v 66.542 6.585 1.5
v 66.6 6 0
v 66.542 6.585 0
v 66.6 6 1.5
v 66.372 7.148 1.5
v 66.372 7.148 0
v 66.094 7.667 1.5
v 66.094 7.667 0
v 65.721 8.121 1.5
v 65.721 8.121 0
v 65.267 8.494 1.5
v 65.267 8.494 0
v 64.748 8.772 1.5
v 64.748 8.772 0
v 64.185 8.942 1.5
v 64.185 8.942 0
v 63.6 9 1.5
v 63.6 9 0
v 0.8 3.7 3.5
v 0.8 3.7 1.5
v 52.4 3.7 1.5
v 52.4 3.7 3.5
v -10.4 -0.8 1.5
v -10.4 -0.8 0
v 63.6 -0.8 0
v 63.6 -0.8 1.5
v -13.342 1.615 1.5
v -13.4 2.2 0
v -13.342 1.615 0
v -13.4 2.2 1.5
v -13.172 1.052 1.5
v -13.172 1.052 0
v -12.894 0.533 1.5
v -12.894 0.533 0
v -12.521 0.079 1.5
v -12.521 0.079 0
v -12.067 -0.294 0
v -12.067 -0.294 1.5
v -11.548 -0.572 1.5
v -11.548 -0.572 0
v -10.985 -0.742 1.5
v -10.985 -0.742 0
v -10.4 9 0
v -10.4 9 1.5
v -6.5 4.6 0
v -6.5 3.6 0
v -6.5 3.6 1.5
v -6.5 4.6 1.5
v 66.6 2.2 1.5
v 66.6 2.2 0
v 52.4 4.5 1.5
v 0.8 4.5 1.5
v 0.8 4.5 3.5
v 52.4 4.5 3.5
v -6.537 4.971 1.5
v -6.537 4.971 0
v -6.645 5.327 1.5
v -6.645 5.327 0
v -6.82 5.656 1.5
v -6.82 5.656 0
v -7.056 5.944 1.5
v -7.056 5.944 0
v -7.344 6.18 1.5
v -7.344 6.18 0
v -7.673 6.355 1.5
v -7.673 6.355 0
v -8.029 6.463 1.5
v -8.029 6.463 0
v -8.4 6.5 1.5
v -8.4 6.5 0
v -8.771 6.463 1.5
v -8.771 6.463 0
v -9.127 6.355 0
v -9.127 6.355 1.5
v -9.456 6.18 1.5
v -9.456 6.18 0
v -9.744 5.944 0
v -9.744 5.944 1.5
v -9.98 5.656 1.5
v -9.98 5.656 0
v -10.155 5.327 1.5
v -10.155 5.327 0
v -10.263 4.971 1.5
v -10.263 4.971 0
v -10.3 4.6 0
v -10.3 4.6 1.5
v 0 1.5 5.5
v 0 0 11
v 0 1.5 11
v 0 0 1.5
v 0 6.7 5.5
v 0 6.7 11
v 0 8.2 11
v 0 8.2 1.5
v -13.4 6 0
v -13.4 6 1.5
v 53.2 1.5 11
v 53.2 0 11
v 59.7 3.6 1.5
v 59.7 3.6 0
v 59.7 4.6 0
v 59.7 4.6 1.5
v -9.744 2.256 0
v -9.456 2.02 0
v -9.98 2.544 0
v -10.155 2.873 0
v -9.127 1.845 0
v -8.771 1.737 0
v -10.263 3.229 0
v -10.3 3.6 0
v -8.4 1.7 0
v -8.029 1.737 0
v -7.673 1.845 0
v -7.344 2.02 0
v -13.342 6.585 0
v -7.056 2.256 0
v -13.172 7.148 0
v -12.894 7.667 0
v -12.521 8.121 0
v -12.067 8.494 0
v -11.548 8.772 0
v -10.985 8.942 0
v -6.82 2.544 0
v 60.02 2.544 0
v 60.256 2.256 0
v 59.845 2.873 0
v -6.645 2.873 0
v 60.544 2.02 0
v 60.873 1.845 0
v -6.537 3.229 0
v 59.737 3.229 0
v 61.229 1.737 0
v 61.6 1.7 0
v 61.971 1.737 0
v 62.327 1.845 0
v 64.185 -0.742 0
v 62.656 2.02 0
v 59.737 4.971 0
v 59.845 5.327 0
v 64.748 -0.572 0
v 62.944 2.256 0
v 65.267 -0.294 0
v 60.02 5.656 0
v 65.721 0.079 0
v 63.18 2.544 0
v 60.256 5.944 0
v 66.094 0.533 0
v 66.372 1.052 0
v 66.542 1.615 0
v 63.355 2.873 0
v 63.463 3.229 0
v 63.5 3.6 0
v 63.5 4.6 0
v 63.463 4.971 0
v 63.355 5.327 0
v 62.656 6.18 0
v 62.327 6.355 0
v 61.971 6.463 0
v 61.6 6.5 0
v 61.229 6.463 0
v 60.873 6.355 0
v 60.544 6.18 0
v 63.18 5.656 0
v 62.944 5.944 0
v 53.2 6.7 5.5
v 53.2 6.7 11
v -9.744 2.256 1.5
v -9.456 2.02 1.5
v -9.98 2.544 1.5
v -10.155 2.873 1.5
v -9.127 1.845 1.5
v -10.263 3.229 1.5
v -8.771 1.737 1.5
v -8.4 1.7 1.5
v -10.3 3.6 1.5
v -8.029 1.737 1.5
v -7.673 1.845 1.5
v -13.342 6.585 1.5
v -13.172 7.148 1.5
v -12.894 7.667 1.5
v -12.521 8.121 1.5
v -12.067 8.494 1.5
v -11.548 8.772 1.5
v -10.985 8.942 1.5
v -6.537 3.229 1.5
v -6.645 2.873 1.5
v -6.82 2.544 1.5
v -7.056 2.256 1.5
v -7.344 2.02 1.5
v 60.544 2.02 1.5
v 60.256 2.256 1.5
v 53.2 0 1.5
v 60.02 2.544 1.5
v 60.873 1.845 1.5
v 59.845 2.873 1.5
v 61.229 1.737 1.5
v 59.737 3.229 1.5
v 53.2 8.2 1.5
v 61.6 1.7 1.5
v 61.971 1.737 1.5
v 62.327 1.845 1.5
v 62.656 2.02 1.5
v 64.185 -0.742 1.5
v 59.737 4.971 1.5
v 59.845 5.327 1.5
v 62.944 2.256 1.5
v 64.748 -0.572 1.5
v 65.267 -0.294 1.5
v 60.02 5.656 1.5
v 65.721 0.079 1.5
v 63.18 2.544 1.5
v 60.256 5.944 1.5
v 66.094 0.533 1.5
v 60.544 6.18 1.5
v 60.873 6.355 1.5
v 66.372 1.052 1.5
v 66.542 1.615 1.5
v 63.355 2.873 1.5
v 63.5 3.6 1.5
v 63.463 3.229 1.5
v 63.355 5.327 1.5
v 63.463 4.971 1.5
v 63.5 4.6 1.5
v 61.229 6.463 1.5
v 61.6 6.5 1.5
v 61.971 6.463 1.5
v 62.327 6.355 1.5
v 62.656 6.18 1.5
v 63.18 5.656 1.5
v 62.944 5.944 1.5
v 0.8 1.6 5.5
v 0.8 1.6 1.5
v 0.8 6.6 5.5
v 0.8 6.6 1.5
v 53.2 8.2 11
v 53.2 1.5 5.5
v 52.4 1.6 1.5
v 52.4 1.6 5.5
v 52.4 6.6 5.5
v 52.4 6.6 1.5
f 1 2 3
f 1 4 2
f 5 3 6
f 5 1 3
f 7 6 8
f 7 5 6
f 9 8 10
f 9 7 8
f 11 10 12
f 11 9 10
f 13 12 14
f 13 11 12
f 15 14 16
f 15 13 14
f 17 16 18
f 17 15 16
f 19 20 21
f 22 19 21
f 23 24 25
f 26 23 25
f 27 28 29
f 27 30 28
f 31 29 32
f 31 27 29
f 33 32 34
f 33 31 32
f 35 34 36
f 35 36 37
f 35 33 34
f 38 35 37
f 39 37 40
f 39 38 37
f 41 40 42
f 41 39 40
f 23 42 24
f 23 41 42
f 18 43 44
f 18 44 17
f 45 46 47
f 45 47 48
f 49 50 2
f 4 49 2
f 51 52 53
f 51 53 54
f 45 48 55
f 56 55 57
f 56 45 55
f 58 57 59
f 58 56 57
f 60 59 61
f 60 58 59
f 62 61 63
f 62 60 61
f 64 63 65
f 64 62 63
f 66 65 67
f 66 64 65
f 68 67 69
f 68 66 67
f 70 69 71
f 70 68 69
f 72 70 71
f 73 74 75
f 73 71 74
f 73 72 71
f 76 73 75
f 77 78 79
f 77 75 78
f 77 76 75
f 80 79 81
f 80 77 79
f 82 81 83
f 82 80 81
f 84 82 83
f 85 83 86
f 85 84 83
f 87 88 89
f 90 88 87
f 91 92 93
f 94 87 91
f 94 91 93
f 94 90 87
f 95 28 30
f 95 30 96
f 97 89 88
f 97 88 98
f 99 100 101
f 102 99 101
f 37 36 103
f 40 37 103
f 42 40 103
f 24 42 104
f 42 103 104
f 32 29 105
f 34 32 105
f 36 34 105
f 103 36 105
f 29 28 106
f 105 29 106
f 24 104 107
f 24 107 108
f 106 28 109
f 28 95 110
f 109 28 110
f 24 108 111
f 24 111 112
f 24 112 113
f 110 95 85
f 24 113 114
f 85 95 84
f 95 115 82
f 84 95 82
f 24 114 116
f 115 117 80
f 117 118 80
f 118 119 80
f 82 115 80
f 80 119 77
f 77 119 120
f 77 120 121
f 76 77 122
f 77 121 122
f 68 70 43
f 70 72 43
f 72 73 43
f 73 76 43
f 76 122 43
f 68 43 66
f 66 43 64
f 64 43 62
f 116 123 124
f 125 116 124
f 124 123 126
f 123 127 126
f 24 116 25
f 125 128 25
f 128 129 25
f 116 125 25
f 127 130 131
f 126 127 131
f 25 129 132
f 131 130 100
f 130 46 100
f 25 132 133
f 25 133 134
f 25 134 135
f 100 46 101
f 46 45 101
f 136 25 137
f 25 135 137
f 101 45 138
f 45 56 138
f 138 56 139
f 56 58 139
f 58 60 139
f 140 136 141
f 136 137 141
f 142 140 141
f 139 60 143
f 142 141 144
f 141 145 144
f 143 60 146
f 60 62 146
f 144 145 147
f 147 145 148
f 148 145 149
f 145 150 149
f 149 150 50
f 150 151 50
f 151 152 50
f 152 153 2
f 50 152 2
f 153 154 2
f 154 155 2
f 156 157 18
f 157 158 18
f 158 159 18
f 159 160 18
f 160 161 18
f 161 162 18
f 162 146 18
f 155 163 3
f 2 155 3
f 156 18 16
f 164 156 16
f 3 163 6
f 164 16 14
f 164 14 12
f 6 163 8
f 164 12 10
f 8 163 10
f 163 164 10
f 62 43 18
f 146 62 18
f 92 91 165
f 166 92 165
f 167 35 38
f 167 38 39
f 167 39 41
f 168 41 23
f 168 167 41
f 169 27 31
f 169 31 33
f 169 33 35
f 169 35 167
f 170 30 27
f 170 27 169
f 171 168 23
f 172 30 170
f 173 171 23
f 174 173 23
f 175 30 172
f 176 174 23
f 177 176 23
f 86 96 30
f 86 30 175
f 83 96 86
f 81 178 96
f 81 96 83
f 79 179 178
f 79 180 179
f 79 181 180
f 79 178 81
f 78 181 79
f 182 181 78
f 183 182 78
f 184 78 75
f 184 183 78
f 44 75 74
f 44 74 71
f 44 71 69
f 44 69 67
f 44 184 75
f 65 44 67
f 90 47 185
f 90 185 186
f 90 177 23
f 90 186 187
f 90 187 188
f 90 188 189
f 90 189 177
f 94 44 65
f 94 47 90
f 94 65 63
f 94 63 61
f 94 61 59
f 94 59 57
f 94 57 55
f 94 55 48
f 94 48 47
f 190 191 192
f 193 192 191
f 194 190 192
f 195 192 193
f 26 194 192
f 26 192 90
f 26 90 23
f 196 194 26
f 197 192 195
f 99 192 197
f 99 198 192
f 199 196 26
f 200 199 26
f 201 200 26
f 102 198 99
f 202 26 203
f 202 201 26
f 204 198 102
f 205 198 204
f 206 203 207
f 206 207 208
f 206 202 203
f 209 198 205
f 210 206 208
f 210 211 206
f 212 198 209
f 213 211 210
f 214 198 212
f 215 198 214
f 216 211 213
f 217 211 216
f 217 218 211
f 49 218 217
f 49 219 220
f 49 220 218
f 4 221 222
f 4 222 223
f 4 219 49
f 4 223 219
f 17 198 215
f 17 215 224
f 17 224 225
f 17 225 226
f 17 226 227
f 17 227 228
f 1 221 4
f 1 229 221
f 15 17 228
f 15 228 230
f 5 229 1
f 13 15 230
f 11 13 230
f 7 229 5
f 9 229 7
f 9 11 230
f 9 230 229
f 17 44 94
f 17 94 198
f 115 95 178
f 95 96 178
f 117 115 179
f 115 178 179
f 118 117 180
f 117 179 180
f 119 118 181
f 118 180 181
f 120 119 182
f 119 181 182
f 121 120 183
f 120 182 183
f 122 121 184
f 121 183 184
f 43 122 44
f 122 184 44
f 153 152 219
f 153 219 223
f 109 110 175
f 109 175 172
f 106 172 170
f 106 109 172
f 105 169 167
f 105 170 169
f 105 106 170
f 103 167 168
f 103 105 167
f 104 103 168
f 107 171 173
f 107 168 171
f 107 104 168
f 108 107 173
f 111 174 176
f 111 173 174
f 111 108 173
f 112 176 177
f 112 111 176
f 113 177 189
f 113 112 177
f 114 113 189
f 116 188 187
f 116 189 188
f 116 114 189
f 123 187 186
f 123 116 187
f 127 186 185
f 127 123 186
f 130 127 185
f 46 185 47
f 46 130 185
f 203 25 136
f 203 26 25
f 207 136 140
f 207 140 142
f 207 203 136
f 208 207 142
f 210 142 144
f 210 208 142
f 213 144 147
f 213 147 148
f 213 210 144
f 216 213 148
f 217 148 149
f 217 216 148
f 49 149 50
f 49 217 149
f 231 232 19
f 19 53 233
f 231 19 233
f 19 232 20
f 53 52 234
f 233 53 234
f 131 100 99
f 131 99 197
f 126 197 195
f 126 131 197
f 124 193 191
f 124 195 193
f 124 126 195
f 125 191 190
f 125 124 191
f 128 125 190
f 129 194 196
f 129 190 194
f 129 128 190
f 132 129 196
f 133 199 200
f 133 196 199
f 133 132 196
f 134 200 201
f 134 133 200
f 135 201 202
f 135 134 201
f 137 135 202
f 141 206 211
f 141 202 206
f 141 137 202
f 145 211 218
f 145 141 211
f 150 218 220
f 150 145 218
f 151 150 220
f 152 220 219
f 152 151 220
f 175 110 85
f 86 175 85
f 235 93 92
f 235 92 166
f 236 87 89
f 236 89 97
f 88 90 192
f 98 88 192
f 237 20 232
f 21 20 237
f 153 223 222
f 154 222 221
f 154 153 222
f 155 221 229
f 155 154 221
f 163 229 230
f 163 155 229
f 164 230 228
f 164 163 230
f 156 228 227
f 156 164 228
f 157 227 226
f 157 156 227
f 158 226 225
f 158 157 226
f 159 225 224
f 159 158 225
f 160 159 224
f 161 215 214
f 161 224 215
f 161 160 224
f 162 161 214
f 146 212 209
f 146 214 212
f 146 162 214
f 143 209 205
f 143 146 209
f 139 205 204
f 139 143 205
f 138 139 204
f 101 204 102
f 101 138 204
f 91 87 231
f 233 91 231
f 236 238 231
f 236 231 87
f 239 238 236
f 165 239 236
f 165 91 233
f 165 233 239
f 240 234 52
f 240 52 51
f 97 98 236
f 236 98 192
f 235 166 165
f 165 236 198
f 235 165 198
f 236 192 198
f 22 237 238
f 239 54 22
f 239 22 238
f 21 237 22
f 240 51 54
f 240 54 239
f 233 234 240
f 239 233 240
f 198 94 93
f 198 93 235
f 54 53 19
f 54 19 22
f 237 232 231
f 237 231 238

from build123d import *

# Parameters (mm, degrees)
BOX003_W          = 51.6
BOX003_H          = 0.8
BOX003_DEPTH      = 2
BOX001_W          = 51.6
BOX001_H          = 5
BOX001_DEPTH      = 4
BOX002_W          = 53.2
BOX002_H          = 5.2
BOX002_DEPTH      = 11
BOX008_W          = 3.8
BOX008_H          = 1
BOX008_DEPTH      = 10
CYLINDER002_R     = 1.9
CYLINDER002_DEPTH = 10
CYLINDER004_R     = 1.9
CYLINDER004_DEPTH = 10
ARRAY003_X_COUNT  = 2
ARRAY003_X_PITCH  = 70
BOX006_W          = 80
BOX006_H          = 9.8
BOX006_DEPTH      = 1.5
FILLET003_R       = 3
BOX_W             = 53.2
BOX_H             = 8.2
BOX_DEPTH         = 11


with BuildPart() as bottom_hole_middle_extraction:
    # Box003 → Box003 (new body)
    with BuildSketch(Plane(origin=(0.8, 3.7, 1.5), x_dir=(1, 0, 0), z_dir=(0, 0, 1))):
        with Locations((25.8, 0.4)):
            Rectangle(BOX003_W, BOX003_H)
    extrude(amount=BOX003_DEPTH)


with BuildPart() as bottom_hole_cut:
    # Box001 → Box001 (new body)
    with BuildSketch(Plane(origin=(0.8, 1.6, 1.5), x_dir=(1, 0, 0), z_dir=(0, 0, 1))):
        with Locations((25.8, 2.5)):
            Rectangle(BOX001_W, BOX001_H)
    extrude(amount=BOX001_DEPTH)

    # Cut003003: cut bottom hole middle extraction
    add(bottom_hole_middle_extraction.part, mode=Mode.SUBTRACT)


with BuildPart() as hole_fusion:
    # Box002 → Box002 (new body)
    with BuildSketch(Plane(origin=(0, 1.5, 5.5), x_dir=(1, 0, 0), z_dir=(0, 0, 1))):
        with Locations((26.6, 2.6)):
            Rectangle(BOX002_W, BOX002_H)
    extrude(amount=BOX002_DEPTH)

    # Fusion: union bottom hole cut
    add(bottom_hole_cut.part)


with BuildPart() as inbetween_holes_cube001:
    # Box008 → Box008 (new body)
    with BuildSketch(Plane(origin=(-1.9, 0, 0), x_dir=(1, 0, 0), z_dir=(0, 0, 1))):
        with Locations((1.9, 0.5)):
            Rectangle(BOX008_W, BOX008_H)
    extrude(amount=BOX008_DEPTH)


with BuildPart() as attach_hole001:
    # Cylinder002 → Cylinder002 (new body)
    with BuildSketch(Plane.XY):
        Circle(CYLINDER002_R)
    extrude(amount=CYLINDER002_DEPTH)


with BuildPart() as attach_hole_array001:
    # Cylinder004 → Cylinder004 (new body)
    with BuildSketch(Plane(origin=(0, 1, 0), x_dir=(1, 0, 0), z_dir=(0, 0, 1))):
        Circle(CYLINDER004_R)
    extrude(amount=CYLINDER004_DEPTH)

    # Fusion002: union inbetween holes cube001, attach hole001
    add(inbetween_holes_cube001.part)
    add(attach_hole001.part)


with BuildPart() as attach_hole_array001_1:
    # Fusion002 placement: moved
    add(attach_hole_array001.part.moved(Location((5, 4.4, 0))))

    # Array003 X: attach hole array001 ×2


with BuildPart() as attach_hole_array001_2:
    add(attach_hole_array001_1.part)
    with Locations(*[(i * ARRAY003_X_PITCH, 0, 0) for i in range(1, ARRAY003_X_COUNT)]):
        add(attach_hole_array001_1.part)


with BuildPart() as attach_plane_x_dir:
    # Box006 → Box006 (new body)
    with BuildSketch(Plane.XY):
        with Locations((40, 4.9)):
            Rectangle(BOX006_W, BOX006_H)
    extrude(amount=BOX006_DEPTH)

    # Fillet003
    fillet003_edges = [attach_plane_x_dir.edges().sort_by_distance(p)[0] for p in [
        (0, 0, 0.75),
        (0, 9.8, 0.75),
        (80, 0, 0.75),
        (80, 9.8, 0.75),
    ]]
    fillet(fillet003_edges, radius=FILLET003_R)

    # Cut003: cut attach hole array001
    add(attach_hole_array001_2.part, mode=Mode.SUBTRACT)


with BuildPart() as attach_plane_x_dir_1:
    # Cut003 placement: moved
    add(attach_plane_x_dir.part.moved(Location((-13.4, -0.8, 0))))


with BuildPart() as body_cut:
    # Box → Box (new body)
    with BuildSketch(Plane.XY):
        with Locations((26.6, 4.1)):
            Rectangle(BOX_W, BOX_H)
    extrude(amount=BOX_DEPTH)

    # Fusion001: union attach plane x dir
    add(attach_plane_x_dir_1.part)

    # Cut: cut hole fusion
    add(hole_fusion.part, mode=Mode.SUBTRACT)


solid = body_cut.part
